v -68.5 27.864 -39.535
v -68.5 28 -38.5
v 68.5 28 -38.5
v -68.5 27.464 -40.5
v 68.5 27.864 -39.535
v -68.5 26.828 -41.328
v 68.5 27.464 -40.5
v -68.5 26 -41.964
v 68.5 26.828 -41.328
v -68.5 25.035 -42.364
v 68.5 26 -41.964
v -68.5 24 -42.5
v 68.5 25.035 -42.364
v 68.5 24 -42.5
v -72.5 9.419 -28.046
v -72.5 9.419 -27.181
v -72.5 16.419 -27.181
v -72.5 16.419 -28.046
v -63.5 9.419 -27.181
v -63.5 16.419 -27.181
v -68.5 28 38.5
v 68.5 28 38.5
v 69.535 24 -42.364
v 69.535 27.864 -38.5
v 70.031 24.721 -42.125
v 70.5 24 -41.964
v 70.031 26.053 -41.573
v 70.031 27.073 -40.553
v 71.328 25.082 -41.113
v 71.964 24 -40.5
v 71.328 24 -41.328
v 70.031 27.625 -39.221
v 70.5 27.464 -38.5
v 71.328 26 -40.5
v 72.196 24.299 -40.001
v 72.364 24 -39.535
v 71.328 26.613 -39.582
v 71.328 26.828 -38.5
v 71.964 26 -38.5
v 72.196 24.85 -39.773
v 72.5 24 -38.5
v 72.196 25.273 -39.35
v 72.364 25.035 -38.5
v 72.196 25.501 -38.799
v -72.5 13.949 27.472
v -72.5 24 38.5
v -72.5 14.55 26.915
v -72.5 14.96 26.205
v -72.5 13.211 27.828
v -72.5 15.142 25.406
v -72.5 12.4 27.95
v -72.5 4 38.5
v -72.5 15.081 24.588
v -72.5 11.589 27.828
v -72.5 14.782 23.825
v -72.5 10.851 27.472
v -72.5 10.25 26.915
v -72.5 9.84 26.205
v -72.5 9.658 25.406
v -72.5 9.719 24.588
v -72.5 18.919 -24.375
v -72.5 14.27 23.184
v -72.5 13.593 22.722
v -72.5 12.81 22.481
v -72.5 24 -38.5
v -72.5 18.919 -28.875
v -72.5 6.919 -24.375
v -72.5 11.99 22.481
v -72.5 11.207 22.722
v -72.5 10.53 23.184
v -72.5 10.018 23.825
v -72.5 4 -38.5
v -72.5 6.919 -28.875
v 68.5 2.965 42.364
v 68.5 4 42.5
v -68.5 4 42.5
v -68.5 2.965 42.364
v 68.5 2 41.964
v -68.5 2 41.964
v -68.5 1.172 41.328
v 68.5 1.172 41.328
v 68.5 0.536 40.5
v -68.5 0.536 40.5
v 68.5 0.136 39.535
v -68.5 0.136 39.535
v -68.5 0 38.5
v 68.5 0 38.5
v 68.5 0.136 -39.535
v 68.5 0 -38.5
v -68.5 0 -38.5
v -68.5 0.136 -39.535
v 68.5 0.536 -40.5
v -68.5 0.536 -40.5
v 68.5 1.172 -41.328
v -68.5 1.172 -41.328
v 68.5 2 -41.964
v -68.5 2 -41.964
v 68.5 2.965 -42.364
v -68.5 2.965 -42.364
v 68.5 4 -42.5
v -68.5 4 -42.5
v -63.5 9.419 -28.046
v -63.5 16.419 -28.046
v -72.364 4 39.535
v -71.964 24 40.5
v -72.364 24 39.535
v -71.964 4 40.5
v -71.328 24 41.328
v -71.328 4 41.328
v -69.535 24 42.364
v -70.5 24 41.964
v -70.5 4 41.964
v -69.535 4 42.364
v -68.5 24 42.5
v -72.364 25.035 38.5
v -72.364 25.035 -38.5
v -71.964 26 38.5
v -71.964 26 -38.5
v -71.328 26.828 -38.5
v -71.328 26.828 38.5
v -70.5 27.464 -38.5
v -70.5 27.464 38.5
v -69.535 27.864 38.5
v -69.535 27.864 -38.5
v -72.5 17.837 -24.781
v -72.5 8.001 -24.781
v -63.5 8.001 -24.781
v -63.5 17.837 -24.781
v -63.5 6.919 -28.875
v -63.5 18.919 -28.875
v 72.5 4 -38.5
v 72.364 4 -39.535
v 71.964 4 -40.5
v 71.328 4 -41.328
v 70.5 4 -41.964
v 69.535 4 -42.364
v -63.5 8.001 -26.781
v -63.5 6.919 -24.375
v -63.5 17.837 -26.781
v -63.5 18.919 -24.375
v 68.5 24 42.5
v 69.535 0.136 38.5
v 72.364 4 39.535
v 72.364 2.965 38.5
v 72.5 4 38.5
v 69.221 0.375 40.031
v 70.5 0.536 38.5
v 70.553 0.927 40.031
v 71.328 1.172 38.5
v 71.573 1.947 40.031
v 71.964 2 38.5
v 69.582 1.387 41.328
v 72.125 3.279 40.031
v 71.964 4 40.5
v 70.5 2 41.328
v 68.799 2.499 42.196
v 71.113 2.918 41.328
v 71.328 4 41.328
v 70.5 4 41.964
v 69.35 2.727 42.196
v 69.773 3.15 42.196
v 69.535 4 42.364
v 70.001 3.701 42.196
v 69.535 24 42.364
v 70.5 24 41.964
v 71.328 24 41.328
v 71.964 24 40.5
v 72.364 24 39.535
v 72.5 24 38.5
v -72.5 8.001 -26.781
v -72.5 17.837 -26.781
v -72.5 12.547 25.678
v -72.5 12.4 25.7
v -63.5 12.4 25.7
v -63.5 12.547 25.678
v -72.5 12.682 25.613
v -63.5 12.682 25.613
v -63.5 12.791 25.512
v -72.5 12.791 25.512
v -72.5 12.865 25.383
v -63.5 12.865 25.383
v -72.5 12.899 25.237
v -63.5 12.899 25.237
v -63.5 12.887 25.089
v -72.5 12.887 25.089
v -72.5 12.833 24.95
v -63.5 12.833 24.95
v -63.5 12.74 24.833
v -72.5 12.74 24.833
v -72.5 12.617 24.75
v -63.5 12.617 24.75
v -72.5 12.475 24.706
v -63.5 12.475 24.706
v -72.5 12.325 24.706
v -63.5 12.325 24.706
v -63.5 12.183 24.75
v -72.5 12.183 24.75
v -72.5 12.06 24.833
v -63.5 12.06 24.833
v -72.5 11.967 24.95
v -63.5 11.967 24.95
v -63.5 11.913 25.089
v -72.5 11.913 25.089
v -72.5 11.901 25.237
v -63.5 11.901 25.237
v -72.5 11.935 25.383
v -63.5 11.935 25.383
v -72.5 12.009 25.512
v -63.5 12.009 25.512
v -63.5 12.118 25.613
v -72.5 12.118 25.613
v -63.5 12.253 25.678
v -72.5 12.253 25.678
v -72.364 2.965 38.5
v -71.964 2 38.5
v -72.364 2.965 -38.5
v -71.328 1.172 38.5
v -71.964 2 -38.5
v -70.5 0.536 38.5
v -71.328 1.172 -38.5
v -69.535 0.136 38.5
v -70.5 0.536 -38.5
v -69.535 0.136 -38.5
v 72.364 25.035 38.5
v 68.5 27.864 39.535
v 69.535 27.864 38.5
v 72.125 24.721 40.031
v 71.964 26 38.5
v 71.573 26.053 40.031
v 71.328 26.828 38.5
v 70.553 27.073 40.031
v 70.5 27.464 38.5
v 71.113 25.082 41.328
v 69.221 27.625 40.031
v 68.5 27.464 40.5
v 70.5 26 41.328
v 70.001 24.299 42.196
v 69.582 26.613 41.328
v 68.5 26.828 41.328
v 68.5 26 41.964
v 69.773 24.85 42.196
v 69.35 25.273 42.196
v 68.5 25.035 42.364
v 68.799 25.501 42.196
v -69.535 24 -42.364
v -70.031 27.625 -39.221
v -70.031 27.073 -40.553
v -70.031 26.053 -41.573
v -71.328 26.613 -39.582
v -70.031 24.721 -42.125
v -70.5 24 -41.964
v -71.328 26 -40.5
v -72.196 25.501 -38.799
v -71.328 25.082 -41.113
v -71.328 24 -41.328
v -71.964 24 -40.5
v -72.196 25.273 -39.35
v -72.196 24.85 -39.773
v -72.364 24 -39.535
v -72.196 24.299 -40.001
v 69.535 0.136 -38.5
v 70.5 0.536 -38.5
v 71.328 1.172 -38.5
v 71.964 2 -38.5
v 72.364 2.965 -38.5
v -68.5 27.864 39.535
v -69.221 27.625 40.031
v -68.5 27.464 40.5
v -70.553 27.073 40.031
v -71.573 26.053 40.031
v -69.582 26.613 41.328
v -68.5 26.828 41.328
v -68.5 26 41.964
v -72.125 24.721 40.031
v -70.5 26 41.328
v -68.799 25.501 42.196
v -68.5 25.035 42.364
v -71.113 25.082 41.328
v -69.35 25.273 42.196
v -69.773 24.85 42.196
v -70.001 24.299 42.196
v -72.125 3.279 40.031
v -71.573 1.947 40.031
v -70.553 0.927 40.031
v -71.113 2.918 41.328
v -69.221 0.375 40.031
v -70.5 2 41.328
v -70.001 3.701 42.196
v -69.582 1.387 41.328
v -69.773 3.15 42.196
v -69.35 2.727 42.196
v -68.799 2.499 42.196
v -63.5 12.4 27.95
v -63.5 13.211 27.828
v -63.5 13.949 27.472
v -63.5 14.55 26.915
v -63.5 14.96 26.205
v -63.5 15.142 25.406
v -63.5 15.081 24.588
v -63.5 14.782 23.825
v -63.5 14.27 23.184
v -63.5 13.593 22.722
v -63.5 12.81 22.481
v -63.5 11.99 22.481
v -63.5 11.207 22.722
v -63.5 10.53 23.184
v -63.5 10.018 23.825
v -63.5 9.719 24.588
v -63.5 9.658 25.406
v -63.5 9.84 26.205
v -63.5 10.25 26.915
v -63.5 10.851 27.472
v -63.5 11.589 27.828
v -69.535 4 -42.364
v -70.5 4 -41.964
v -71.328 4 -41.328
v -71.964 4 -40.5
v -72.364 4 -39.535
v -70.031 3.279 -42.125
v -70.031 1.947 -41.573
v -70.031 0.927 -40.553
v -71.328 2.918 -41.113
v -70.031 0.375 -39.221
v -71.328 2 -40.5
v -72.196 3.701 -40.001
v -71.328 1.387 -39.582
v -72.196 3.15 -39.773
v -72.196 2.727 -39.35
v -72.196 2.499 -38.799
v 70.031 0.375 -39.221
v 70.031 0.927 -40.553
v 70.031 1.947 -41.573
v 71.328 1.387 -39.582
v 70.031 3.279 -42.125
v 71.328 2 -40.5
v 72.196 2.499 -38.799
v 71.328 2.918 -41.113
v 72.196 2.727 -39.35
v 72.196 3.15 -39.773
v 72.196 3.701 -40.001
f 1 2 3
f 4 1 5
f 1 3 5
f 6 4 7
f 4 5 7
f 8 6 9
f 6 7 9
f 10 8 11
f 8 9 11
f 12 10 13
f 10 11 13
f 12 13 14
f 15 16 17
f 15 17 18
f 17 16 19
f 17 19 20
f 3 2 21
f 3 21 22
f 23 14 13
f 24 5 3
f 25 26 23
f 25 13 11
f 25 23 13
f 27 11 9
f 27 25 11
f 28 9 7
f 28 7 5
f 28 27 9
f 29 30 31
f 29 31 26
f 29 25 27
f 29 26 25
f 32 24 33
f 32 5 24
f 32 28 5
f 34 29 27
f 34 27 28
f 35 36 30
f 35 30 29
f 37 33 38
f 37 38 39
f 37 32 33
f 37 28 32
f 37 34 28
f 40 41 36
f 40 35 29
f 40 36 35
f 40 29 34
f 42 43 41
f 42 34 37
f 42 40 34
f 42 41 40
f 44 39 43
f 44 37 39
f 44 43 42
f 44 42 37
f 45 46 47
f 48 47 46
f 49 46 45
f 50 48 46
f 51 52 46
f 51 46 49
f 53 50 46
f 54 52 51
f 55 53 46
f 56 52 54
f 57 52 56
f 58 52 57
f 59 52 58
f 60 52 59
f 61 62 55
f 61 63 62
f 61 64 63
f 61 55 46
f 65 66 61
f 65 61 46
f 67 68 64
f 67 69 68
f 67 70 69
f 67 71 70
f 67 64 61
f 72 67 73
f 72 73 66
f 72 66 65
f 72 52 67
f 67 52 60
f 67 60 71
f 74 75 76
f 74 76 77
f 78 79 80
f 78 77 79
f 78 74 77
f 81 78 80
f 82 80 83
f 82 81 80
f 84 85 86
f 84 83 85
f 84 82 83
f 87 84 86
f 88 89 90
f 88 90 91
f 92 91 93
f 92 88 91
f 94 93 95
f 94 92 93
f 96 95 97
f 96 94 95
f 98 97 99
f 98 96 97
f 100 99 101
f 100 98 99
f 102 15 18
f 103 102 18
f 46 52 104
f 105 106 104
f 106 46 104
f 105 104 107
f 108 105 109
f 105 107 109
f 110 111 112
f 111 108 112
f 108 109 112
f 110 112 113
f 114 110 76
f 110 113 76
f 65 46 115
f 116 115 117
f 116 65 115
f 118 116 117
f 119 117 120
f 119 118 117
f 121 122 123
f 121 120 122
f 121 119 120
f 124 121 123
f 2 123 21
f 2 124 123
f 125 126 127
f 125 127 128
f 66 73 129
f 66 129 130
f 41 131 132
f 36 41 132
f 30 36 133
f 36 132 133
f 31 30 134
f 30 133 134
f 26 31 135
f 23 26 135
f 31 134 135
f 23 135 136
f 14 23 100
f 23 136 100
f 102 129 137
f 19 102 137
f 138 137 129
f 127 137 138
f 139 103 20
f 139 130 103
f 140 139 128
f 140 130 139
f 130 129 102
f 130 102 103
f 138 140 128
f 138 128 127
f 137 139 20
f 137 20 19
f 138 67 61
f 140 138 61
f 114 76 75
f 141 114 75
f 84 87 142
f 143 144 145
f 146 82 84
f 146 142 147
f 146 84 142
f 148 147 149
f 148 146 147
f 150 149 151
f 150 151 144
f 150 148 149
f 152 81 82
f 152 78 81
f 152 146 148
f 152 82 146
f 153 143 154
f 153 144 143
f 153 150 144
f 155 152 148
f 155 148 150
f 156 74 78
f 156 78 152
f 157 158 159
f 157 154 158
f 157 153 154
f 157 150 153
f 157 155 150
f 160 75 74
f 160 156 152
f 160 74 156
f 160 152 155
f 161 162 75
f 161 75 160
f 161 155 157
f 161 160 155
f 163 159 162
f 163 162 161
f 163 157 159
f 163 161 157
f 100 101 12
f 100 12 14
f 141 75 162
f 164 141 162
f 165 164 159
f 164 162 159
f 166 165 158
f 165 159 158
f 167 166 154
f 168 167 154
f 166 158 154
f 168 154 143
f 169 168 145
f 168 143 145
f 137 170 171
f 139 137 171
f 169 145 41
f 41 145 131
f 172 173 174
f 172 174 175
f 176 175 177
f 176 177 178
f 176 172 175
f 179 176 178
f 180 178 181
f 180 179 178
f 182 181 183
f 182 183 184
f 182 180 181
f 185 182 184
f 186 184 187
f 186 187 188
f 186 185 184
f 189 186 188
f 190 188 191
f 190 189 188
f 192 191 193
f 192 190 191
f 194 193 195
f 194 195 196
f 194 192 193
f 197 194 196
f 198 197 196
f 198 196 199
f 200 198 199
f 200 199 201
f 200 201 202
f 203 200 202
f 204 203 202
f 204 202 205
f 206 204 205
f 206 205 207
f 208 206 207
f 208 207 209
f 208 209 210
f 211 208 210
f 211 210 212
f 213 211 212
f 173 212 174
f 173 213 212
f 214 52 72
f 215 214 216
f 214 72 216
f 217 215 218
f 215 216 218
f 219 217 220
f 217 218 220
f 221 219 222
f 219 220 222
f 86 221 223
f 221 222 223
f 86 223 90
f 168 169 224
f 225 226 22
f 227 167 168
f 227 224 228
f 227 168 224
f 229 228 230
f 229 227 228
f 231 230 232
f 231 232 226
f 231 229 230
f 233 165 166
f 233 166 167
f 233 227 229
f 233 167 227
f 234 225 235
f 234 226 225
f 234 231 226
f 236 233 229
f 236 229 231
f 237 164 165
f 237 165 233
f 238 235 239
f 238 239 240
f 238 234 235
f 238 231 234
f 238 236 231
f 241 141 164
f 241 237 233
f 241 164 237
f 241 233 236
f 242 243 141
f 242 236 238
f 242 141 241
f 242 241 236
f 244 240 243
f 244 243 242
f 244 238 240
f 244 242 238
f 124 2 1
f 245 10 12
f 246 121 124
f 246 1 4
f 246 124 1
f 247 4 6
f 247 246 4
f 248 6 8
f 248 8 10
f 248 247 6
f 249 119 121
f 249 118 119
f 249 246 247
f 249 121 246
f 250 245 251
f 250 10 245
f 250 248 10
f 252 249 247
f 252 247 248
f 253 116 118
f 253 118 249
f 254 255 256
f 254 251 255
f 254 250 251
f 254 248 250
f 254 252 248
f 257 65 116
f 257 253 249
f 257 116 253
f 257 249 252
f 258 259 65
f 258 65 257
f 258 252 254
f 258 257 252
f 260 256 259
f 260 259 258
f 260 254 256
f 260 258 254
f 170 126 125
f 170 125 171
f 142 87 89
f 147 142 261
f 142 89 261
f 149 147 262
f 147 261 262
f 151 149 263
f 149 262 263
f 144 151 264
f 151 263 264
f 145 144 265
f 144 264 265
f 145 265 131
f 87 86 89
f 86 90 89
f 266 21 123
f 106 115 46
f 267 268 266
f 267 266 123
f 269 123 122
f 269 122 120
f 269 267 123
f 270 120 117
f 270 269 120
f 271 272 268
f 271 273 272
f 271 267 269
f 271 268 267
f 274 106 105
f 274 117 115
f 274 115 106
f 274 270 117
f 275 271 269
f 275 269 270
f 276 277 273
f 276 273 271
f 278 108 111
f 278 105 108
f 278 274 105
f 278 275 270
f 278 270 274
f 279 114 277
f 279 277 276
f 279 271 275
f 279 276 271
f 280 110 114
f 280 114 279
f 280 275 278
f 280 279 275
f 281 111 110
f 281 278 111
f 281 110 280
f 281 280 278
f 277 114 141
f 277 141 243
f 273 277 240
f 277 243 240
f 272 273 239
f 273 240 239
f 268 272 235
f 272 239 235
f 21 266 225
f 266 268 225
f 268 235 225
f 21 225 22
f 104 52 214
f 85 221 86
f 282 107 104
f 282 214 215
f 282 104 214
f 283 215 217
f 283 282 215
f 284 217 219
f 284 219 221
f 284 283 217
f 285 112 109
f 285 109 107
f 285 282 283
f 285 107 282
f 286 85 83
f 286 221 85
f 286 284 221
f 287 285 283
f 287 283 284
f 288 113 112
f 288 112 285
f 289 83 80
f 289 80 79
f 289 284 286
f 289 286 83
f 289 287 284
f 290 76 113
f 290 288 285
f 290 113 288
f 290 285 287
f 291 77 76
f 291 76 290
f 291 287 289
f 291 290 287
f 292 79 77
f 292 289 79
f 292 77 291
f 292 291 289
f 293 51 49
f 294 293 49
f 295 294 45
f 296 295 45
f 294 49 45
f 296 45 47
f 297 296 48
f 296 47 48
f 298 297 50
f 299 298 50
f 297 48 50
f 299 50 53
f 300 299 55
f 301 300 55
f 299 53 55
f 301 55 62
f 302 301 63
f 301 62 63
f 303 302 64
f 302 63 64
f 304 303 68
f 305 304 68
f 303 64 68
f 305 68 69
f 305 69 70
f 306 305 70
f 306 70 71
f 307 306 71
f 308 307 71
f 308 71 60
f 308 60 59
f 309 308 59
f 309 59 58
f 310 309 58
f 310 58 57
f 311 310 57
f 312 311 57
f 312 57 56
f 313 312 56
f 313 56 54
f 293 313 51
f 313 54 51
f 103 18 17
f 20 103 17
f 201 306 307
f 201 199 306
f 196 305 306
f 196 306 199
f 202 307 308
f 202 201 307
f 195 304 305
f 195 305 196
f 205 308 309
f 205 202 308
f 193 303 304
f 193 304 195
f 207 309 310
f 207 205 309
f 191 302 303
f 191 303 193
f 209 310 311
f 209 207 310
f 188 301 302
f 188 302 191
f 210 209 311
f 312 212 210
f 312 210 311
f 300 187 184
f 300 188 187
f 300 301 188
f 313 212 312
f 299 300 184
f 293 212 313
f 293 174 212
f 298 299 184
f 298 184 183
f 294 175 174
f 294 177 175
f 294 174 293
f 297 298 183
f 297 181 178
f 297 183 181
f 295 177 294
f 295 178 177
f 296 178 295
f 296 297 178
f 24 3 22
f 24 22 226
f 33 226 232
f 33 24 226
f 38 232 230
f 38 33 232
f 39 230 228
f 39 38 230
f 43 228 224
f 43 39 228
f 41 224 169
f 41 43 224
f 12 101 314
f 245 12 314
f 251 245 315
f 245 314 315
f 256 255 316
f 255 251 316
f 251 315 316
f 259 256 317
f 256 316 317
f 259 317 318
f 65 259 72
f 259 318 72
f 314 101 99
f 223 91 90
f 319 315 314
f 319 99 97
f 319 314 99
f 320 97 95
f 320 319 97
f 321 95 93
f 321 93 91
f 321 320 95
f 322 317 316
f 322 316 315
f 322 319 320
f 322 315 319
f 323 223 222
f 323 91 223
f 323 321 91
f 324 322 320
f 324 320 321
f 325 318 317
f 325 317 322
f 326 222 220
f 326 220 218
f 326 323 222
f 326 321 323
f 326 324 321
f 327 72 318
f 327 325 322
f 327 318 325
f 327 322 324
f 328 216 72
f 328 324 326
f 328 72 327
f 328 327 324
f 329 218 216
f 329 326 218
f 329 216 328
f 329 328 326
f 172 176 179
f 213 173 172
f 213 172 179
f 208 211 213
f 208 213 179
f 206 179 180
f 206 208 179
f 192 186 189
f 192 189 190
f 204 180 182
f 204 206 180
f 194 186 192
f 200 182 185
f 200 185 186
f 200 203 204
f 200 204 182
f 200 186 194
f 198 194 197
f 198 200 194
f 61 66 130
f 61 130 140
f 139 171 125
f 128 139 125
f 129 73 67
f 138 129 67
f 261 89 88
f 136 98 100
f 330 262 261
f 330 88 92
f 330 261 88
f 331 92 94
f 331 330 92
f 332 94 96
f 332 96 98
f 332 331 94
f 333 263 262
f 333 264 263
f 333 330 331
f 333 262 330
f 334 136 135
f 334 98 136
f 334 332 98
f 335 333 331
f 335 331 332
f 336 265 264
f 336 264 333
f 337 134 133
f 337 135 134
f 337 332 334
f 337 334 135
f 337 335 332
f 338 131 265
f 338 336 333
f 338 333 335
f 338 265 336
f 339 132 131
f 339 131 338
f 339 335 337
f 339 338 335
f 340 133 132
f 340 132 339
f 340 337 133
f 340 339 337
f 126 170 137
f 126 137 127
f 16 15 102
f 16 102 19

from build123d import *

# Parameters (mm, degrees)
IZIM1_W                     = 145
IZIM1_H                     = 85
Y_KSEKLIK_EKSTR_ZYON1_DEPTH = 28
IZIM2_R                     = 2.75
IZIM2_R_2                   = 0.5
KES_EKSTR_ZYON1_DEPTH       = 9
IZIM3_W                     = 4.5
IZIM3_H                     = 12
IZIM3_W_2                   = 2
IZIM3_H_2                   = 9.835751208
IZIM3_W_3                   = 0.86567422
IZIM3_H_3                   = 7
KES_EKSTR_ZYON2_DEPTH       = 9
RADYUS3_R                   = 4
RADYUS6_R                   = 4
RADYUS7_R                   = 4


with BuildPart() as part:
    # Çizim1 → Yükseklik-Ekstrüzyon1 (new body)
    with BuildSketch(Plane(origin=(0, 0, 0), x_dir=(1, 0, 0), z_dir=(0, 1, 0))):
        Rectangle(IZIM1_W, IZIM1_H)
    extrude(amount=Y_KSEKLIK_EKSTR_ZYON1_DEPTH)

    # Çizim2 → Kes-Ekstrüzyon1 (cut)
    with BuildSketch(Plane.ZY.offset(72.5)):
        with Locations((25.2, 12.4)):
            Circle(IZIM2_R)
        with Locations((25.2, 12.4)):
            Circle(IZIM2_R_2, mode=Mode.SUBTRACT)
    extrude(amount=-KES_EKSTR_ZYON1_DEPTH, mode=Mode.SUBTRACT)

    # Çizim3 → Kes-Ekstrüzyon2 (cut)
    with BuildSketch(Plane.ZY.offset(72.5)):
        with Locations((-26.625, 12.91875)):
            Rectangle(IZIM3_W, IZIM3_H)
        with Locations((-25.780796649, 12.91875)):
            Rectangle(IZIM3_W_2, IZIM3_H_2, mode=Mode.SUBTRACT)
        with Locations((-27.613610368, 12.91875)):
            Rectangle(IZIM3_W_3, IZIM3_H_3, mode=Mode.SUBTRACT)
    extrude(amount=-KES_EKSTR_ZYON2_DEPTH, mode=Mode.SUBTRACT)

    # Radyus3
    radyus3_edges = [part.edges().sort_by_distance(p)[0] for p in [
        (-72.5, 28, 0),
        (0, 28, 42.5),
        (72.5, 28, 0),
        (0, 28, -42.5),
    ]]
    fillet(radyus3_edges, radius=RADYUS3_R)

    # Radyus6
    radyus6_edges = [part.edges().sort_by_distance(p)[0] for p in [
        (0, 0, 42.5),
        (-72.5, 0, 0),
        (0, 0, -42.5),
        (72.5, 0, 0),
    ]]
    fillet(radyus6_edges, radius=RADYUS6_R)

    # Radyus7
    # the kernel refuses this fillet: 4 mm, written as the material it takes off along each edge
    with BuildSketch(Plane(origin=(-68.5, 24, 38.5), x_dir=(-1, 0, 0), z_dir=(0, 0, 1))) as radyus7_piece_1_section:
        Polygon((0, 0), (RADYUS7_R, 0), (RADYUS7_R, -RADYUS7_R), (0, -RADYUS7_R), align=None)
    radyus7_piece_1 = extrude(amount=RADYUS7_R, mode=Mode.PRIVATE)
    radyus7_piece_1 = radyus7_piece_1 - Plane(origin=(-68.5, 24, 38.5), x_dir=(0.7071067811865475, -0.7071067811865475, 0), z_dir=(0, 0, 1)) * Sphere(RADYUS7_R, mode=Mode.PRIVATE)
    add(radyus7_piece_1, mode=Mode.SUBTRACT)
    with BuildSketch(Plane(origin=(-68.5, 24, -38.5), x_dir=(0, 0, -1), z_dir=(-1, 0, 0))) as radyus7_piece_2_section:
        Polygon((0, 0), (RADYUS7_R, 0), (RADYUS7_R, -RADYUS7_R), (0, -RADYUS7_R), align=None)
    radyus7_piece_2 = extrude(amount=RADYUS7_R, mode=Mode.PRIVATE)
    radyus7_piece_2 = radyus7_piece_2 - Plane(origin=(-68.5, 24, -38.5), x_dir=(0, -0.7071067811865475, 0.7071067811865475), z_dir=(-1, 0, 0)) * Sphere(RADYUS7_R, mode=Mode.PRIVATE)
    add(radyus7_piece_2, mode=Mode.SUBTRACT)
    with BuildSketch(Plane(origin=(68.5, 24, 38.5), x_dir=(1, 0, 0), z_dir=(0, 0, 1))) as radyus7_piece_3_section:
        Polygon((0, 0), (RADYUS7_R, 0), (RADYUS7_R, RADYUS7_R), (0, RADYUS7_R), align=None)
    radyus7_piece_3 = extrude(amount=RADYUS7_R, mode=Mode.PRIVATE)
    radyus7_piece_3 = radyus7_piece_3 - Plane(origin=(68.5, 24, 38.5), x_dir=(-0.7071067811865475, -0.7071067811865475, 0), z_dir=(0, 0, 1)) * Sphere(RADYUS7_R, mode=Mode.PRIVATE)
    add(radyus7_piece_3, mode=Mode.SUBTRACT)
    with BuildSketch(Plane(origin=(68.5, 24, -38.5), x_dir=(0, 0, -1), z_dir=(1, 0, 0))) as radyus7_piece_4_section:
        Polygon((0, 0), (RADYUS7_R, 0), (RADYUS7_R, RADYUS7_R), (0, RADYUS7_R), align=None)
    radyus7_piece_4 = extrude(amount=RADYUS7_R, mode=Mode.PRIVATE)
    radyus7_piece_4 = radyus7_piece_4 - Plane(origin=(68.5, 24, -38.5), x_dir=(0, -0.7071067811865475, 0.7071067811865475), z_dir=(1, 0, 0)) * Sphere(RADYUS7_R, mode=Mode.PRIVATE)
    add(radyus7_piece_4, mode=Mode.SUBTRACT)
    with BuildSketch(Plane(origin=(68.5, 4, 38.5), x_dir=(1, 0, 0), z_dir=(0, 0, 1))) as radyus7_piece_5_section:
        Polygon((0, 0), (RADYUS7_R, 0), (RADYUS7_R, -RADYUS7_R), (0, -RADYUS7_R), align=None)
    radyus7_piece_5 = extrude(amount=RADYUS7_R, mode=Mode.PRIVATE)
    radyus7_piece_5 = radyus7_piece_5 - Plane(origin=(68.5, 4, 38.5), x_dir=(-0.7071067811865475, 0.7071067811865475, 0), z_dir=(0, 0, 1)) * Sphere(RADYUS7_R, mode=Mode.PRIVATE)
    add(radyus7_piece_5, mode=Mode.SUBTRACT)
    with BuildSketch(Plane(origin=(-68.5, 4, 38.5), x_dir=(-1, 0, 0), z_dir=(0, 0, 1))) as radyus7_piece_6_section:
        Polygon((0, 0), (RADYUS7_R, 0), (RADYUS7_R, RADYUS7_R), (0, RADYUS7_R), align=None)
    radyus7_piece_6 = extrude(amount=RADYUS7_R, mode=Mode.PRIVATE)
    radyus7_piece_6 = radyus7_piece_6 - Plane(origin=(-68.5, 4, 38.5), x_dir=(0.7071067811865475, 0.7071067811865475, 0), z_dir=(0, 0, 1)) * Sphere(RADYUS7_R, mode=Mode.PRIVATE)
    add(radyus7_piece_6, mode=Mode.SUBTRACT)
    with BuildSketch(Plane(origin=(68.5, 4, -38.5), x_dir=(0, 0, -1), z_dir=(1, 0, 0))) as radyus7_piece_7_section:
        Polygon((0, 0), (RADYUS7_R, 0), (RADYUS7_R, -RADYUS7_R), (0, -RADYUS7_R), align=None)
    radyus7_piece_7 = extrude(amount=RADYUS7_R, mode=Mode.PRIVATE)
    radyus7_piece_7 = radyus7_piece_7 - Plane(origin=(68.5, 4, -38.5), x_dir=(0, 0.7071067811865475, 0.7071067811865475), z_dir=(1, 0, 0)) * Sphere(RADYUS7_R, mode=Mode.PRIVATE)
    add(radyus7_piece_7, mode=Mode.SUBTRACT)
    with BuildSketch(Plane(origin=(-68.5, 4, -38.5), x_dir=(0, 0, -1), z_dir=(-1, 0, 0))) as radyus7_piece_8_section:
        Polygon((0, 0), (RADYUS7_R, 0), (RADYUS7_R, RADYUS7_R), (0, RADYUS7_R), align=None)
    radyus7_piece_8 = extrude(amount=RADYUS7_R, mode=Mode.PRIVATE)
    radyus7_piece_8 = radyus7_piece_8 - Plane(origin=(-68.5, 4, -38.5), x_dir=(0, 0.7071067811865475, 0.7071067811865475), z_dir=(-1, 0, 0)) * Sphere(RADYUS7_R, mode=Mode.PRIVATE)
    add(radyus7_piece_8, mode=Mode.SUBTRACT)
    with BuildSketch(Plane(origin=(72.5, 4, -42.5), x_dir=(0, 0, 1), z_dir=(0, 1, 0)), Plane(origin=(72.5, 4, 42.5), x_dir=(-1, 0, 0), z_dir=(0, 1, 0))) as radyus7_piece_9:
        with BuildLine():
            CenterArc((RADYUS7_R, -RADYUS7_R), RADYUS7_R, 90, 90)
            Line((0, -RADYUS7_R), (0, 0))
            Line((0, 0), (RADYUS7_R, 0))
        make_face()
    extrude(amount=20, mode=Mode.SUBTRACT)
    with BuildSketch(Plane(origin=(-72.5, 4, -42.5), x_dir=(0, 0, 1), z_dir=(0, 1, 0)), Plane(origin=(-72.5, 4, 42.5), x_dir=(1, 0, 0), z_dir=(0, 1, 0))) as radyus7_piece_10:
        with BuildLine():
            CenterArc((RADYUS7_R, RADYUS7_R), RADYUS7_R, 180, 90)
            Line((0, RADYUS7_R), (0, 0))
            Line((0, 0), (RADYUS7_R, 0))
        make_face()
    extrude(amount=20, mode=Mode.SUBTRACT)


solid = part.part
